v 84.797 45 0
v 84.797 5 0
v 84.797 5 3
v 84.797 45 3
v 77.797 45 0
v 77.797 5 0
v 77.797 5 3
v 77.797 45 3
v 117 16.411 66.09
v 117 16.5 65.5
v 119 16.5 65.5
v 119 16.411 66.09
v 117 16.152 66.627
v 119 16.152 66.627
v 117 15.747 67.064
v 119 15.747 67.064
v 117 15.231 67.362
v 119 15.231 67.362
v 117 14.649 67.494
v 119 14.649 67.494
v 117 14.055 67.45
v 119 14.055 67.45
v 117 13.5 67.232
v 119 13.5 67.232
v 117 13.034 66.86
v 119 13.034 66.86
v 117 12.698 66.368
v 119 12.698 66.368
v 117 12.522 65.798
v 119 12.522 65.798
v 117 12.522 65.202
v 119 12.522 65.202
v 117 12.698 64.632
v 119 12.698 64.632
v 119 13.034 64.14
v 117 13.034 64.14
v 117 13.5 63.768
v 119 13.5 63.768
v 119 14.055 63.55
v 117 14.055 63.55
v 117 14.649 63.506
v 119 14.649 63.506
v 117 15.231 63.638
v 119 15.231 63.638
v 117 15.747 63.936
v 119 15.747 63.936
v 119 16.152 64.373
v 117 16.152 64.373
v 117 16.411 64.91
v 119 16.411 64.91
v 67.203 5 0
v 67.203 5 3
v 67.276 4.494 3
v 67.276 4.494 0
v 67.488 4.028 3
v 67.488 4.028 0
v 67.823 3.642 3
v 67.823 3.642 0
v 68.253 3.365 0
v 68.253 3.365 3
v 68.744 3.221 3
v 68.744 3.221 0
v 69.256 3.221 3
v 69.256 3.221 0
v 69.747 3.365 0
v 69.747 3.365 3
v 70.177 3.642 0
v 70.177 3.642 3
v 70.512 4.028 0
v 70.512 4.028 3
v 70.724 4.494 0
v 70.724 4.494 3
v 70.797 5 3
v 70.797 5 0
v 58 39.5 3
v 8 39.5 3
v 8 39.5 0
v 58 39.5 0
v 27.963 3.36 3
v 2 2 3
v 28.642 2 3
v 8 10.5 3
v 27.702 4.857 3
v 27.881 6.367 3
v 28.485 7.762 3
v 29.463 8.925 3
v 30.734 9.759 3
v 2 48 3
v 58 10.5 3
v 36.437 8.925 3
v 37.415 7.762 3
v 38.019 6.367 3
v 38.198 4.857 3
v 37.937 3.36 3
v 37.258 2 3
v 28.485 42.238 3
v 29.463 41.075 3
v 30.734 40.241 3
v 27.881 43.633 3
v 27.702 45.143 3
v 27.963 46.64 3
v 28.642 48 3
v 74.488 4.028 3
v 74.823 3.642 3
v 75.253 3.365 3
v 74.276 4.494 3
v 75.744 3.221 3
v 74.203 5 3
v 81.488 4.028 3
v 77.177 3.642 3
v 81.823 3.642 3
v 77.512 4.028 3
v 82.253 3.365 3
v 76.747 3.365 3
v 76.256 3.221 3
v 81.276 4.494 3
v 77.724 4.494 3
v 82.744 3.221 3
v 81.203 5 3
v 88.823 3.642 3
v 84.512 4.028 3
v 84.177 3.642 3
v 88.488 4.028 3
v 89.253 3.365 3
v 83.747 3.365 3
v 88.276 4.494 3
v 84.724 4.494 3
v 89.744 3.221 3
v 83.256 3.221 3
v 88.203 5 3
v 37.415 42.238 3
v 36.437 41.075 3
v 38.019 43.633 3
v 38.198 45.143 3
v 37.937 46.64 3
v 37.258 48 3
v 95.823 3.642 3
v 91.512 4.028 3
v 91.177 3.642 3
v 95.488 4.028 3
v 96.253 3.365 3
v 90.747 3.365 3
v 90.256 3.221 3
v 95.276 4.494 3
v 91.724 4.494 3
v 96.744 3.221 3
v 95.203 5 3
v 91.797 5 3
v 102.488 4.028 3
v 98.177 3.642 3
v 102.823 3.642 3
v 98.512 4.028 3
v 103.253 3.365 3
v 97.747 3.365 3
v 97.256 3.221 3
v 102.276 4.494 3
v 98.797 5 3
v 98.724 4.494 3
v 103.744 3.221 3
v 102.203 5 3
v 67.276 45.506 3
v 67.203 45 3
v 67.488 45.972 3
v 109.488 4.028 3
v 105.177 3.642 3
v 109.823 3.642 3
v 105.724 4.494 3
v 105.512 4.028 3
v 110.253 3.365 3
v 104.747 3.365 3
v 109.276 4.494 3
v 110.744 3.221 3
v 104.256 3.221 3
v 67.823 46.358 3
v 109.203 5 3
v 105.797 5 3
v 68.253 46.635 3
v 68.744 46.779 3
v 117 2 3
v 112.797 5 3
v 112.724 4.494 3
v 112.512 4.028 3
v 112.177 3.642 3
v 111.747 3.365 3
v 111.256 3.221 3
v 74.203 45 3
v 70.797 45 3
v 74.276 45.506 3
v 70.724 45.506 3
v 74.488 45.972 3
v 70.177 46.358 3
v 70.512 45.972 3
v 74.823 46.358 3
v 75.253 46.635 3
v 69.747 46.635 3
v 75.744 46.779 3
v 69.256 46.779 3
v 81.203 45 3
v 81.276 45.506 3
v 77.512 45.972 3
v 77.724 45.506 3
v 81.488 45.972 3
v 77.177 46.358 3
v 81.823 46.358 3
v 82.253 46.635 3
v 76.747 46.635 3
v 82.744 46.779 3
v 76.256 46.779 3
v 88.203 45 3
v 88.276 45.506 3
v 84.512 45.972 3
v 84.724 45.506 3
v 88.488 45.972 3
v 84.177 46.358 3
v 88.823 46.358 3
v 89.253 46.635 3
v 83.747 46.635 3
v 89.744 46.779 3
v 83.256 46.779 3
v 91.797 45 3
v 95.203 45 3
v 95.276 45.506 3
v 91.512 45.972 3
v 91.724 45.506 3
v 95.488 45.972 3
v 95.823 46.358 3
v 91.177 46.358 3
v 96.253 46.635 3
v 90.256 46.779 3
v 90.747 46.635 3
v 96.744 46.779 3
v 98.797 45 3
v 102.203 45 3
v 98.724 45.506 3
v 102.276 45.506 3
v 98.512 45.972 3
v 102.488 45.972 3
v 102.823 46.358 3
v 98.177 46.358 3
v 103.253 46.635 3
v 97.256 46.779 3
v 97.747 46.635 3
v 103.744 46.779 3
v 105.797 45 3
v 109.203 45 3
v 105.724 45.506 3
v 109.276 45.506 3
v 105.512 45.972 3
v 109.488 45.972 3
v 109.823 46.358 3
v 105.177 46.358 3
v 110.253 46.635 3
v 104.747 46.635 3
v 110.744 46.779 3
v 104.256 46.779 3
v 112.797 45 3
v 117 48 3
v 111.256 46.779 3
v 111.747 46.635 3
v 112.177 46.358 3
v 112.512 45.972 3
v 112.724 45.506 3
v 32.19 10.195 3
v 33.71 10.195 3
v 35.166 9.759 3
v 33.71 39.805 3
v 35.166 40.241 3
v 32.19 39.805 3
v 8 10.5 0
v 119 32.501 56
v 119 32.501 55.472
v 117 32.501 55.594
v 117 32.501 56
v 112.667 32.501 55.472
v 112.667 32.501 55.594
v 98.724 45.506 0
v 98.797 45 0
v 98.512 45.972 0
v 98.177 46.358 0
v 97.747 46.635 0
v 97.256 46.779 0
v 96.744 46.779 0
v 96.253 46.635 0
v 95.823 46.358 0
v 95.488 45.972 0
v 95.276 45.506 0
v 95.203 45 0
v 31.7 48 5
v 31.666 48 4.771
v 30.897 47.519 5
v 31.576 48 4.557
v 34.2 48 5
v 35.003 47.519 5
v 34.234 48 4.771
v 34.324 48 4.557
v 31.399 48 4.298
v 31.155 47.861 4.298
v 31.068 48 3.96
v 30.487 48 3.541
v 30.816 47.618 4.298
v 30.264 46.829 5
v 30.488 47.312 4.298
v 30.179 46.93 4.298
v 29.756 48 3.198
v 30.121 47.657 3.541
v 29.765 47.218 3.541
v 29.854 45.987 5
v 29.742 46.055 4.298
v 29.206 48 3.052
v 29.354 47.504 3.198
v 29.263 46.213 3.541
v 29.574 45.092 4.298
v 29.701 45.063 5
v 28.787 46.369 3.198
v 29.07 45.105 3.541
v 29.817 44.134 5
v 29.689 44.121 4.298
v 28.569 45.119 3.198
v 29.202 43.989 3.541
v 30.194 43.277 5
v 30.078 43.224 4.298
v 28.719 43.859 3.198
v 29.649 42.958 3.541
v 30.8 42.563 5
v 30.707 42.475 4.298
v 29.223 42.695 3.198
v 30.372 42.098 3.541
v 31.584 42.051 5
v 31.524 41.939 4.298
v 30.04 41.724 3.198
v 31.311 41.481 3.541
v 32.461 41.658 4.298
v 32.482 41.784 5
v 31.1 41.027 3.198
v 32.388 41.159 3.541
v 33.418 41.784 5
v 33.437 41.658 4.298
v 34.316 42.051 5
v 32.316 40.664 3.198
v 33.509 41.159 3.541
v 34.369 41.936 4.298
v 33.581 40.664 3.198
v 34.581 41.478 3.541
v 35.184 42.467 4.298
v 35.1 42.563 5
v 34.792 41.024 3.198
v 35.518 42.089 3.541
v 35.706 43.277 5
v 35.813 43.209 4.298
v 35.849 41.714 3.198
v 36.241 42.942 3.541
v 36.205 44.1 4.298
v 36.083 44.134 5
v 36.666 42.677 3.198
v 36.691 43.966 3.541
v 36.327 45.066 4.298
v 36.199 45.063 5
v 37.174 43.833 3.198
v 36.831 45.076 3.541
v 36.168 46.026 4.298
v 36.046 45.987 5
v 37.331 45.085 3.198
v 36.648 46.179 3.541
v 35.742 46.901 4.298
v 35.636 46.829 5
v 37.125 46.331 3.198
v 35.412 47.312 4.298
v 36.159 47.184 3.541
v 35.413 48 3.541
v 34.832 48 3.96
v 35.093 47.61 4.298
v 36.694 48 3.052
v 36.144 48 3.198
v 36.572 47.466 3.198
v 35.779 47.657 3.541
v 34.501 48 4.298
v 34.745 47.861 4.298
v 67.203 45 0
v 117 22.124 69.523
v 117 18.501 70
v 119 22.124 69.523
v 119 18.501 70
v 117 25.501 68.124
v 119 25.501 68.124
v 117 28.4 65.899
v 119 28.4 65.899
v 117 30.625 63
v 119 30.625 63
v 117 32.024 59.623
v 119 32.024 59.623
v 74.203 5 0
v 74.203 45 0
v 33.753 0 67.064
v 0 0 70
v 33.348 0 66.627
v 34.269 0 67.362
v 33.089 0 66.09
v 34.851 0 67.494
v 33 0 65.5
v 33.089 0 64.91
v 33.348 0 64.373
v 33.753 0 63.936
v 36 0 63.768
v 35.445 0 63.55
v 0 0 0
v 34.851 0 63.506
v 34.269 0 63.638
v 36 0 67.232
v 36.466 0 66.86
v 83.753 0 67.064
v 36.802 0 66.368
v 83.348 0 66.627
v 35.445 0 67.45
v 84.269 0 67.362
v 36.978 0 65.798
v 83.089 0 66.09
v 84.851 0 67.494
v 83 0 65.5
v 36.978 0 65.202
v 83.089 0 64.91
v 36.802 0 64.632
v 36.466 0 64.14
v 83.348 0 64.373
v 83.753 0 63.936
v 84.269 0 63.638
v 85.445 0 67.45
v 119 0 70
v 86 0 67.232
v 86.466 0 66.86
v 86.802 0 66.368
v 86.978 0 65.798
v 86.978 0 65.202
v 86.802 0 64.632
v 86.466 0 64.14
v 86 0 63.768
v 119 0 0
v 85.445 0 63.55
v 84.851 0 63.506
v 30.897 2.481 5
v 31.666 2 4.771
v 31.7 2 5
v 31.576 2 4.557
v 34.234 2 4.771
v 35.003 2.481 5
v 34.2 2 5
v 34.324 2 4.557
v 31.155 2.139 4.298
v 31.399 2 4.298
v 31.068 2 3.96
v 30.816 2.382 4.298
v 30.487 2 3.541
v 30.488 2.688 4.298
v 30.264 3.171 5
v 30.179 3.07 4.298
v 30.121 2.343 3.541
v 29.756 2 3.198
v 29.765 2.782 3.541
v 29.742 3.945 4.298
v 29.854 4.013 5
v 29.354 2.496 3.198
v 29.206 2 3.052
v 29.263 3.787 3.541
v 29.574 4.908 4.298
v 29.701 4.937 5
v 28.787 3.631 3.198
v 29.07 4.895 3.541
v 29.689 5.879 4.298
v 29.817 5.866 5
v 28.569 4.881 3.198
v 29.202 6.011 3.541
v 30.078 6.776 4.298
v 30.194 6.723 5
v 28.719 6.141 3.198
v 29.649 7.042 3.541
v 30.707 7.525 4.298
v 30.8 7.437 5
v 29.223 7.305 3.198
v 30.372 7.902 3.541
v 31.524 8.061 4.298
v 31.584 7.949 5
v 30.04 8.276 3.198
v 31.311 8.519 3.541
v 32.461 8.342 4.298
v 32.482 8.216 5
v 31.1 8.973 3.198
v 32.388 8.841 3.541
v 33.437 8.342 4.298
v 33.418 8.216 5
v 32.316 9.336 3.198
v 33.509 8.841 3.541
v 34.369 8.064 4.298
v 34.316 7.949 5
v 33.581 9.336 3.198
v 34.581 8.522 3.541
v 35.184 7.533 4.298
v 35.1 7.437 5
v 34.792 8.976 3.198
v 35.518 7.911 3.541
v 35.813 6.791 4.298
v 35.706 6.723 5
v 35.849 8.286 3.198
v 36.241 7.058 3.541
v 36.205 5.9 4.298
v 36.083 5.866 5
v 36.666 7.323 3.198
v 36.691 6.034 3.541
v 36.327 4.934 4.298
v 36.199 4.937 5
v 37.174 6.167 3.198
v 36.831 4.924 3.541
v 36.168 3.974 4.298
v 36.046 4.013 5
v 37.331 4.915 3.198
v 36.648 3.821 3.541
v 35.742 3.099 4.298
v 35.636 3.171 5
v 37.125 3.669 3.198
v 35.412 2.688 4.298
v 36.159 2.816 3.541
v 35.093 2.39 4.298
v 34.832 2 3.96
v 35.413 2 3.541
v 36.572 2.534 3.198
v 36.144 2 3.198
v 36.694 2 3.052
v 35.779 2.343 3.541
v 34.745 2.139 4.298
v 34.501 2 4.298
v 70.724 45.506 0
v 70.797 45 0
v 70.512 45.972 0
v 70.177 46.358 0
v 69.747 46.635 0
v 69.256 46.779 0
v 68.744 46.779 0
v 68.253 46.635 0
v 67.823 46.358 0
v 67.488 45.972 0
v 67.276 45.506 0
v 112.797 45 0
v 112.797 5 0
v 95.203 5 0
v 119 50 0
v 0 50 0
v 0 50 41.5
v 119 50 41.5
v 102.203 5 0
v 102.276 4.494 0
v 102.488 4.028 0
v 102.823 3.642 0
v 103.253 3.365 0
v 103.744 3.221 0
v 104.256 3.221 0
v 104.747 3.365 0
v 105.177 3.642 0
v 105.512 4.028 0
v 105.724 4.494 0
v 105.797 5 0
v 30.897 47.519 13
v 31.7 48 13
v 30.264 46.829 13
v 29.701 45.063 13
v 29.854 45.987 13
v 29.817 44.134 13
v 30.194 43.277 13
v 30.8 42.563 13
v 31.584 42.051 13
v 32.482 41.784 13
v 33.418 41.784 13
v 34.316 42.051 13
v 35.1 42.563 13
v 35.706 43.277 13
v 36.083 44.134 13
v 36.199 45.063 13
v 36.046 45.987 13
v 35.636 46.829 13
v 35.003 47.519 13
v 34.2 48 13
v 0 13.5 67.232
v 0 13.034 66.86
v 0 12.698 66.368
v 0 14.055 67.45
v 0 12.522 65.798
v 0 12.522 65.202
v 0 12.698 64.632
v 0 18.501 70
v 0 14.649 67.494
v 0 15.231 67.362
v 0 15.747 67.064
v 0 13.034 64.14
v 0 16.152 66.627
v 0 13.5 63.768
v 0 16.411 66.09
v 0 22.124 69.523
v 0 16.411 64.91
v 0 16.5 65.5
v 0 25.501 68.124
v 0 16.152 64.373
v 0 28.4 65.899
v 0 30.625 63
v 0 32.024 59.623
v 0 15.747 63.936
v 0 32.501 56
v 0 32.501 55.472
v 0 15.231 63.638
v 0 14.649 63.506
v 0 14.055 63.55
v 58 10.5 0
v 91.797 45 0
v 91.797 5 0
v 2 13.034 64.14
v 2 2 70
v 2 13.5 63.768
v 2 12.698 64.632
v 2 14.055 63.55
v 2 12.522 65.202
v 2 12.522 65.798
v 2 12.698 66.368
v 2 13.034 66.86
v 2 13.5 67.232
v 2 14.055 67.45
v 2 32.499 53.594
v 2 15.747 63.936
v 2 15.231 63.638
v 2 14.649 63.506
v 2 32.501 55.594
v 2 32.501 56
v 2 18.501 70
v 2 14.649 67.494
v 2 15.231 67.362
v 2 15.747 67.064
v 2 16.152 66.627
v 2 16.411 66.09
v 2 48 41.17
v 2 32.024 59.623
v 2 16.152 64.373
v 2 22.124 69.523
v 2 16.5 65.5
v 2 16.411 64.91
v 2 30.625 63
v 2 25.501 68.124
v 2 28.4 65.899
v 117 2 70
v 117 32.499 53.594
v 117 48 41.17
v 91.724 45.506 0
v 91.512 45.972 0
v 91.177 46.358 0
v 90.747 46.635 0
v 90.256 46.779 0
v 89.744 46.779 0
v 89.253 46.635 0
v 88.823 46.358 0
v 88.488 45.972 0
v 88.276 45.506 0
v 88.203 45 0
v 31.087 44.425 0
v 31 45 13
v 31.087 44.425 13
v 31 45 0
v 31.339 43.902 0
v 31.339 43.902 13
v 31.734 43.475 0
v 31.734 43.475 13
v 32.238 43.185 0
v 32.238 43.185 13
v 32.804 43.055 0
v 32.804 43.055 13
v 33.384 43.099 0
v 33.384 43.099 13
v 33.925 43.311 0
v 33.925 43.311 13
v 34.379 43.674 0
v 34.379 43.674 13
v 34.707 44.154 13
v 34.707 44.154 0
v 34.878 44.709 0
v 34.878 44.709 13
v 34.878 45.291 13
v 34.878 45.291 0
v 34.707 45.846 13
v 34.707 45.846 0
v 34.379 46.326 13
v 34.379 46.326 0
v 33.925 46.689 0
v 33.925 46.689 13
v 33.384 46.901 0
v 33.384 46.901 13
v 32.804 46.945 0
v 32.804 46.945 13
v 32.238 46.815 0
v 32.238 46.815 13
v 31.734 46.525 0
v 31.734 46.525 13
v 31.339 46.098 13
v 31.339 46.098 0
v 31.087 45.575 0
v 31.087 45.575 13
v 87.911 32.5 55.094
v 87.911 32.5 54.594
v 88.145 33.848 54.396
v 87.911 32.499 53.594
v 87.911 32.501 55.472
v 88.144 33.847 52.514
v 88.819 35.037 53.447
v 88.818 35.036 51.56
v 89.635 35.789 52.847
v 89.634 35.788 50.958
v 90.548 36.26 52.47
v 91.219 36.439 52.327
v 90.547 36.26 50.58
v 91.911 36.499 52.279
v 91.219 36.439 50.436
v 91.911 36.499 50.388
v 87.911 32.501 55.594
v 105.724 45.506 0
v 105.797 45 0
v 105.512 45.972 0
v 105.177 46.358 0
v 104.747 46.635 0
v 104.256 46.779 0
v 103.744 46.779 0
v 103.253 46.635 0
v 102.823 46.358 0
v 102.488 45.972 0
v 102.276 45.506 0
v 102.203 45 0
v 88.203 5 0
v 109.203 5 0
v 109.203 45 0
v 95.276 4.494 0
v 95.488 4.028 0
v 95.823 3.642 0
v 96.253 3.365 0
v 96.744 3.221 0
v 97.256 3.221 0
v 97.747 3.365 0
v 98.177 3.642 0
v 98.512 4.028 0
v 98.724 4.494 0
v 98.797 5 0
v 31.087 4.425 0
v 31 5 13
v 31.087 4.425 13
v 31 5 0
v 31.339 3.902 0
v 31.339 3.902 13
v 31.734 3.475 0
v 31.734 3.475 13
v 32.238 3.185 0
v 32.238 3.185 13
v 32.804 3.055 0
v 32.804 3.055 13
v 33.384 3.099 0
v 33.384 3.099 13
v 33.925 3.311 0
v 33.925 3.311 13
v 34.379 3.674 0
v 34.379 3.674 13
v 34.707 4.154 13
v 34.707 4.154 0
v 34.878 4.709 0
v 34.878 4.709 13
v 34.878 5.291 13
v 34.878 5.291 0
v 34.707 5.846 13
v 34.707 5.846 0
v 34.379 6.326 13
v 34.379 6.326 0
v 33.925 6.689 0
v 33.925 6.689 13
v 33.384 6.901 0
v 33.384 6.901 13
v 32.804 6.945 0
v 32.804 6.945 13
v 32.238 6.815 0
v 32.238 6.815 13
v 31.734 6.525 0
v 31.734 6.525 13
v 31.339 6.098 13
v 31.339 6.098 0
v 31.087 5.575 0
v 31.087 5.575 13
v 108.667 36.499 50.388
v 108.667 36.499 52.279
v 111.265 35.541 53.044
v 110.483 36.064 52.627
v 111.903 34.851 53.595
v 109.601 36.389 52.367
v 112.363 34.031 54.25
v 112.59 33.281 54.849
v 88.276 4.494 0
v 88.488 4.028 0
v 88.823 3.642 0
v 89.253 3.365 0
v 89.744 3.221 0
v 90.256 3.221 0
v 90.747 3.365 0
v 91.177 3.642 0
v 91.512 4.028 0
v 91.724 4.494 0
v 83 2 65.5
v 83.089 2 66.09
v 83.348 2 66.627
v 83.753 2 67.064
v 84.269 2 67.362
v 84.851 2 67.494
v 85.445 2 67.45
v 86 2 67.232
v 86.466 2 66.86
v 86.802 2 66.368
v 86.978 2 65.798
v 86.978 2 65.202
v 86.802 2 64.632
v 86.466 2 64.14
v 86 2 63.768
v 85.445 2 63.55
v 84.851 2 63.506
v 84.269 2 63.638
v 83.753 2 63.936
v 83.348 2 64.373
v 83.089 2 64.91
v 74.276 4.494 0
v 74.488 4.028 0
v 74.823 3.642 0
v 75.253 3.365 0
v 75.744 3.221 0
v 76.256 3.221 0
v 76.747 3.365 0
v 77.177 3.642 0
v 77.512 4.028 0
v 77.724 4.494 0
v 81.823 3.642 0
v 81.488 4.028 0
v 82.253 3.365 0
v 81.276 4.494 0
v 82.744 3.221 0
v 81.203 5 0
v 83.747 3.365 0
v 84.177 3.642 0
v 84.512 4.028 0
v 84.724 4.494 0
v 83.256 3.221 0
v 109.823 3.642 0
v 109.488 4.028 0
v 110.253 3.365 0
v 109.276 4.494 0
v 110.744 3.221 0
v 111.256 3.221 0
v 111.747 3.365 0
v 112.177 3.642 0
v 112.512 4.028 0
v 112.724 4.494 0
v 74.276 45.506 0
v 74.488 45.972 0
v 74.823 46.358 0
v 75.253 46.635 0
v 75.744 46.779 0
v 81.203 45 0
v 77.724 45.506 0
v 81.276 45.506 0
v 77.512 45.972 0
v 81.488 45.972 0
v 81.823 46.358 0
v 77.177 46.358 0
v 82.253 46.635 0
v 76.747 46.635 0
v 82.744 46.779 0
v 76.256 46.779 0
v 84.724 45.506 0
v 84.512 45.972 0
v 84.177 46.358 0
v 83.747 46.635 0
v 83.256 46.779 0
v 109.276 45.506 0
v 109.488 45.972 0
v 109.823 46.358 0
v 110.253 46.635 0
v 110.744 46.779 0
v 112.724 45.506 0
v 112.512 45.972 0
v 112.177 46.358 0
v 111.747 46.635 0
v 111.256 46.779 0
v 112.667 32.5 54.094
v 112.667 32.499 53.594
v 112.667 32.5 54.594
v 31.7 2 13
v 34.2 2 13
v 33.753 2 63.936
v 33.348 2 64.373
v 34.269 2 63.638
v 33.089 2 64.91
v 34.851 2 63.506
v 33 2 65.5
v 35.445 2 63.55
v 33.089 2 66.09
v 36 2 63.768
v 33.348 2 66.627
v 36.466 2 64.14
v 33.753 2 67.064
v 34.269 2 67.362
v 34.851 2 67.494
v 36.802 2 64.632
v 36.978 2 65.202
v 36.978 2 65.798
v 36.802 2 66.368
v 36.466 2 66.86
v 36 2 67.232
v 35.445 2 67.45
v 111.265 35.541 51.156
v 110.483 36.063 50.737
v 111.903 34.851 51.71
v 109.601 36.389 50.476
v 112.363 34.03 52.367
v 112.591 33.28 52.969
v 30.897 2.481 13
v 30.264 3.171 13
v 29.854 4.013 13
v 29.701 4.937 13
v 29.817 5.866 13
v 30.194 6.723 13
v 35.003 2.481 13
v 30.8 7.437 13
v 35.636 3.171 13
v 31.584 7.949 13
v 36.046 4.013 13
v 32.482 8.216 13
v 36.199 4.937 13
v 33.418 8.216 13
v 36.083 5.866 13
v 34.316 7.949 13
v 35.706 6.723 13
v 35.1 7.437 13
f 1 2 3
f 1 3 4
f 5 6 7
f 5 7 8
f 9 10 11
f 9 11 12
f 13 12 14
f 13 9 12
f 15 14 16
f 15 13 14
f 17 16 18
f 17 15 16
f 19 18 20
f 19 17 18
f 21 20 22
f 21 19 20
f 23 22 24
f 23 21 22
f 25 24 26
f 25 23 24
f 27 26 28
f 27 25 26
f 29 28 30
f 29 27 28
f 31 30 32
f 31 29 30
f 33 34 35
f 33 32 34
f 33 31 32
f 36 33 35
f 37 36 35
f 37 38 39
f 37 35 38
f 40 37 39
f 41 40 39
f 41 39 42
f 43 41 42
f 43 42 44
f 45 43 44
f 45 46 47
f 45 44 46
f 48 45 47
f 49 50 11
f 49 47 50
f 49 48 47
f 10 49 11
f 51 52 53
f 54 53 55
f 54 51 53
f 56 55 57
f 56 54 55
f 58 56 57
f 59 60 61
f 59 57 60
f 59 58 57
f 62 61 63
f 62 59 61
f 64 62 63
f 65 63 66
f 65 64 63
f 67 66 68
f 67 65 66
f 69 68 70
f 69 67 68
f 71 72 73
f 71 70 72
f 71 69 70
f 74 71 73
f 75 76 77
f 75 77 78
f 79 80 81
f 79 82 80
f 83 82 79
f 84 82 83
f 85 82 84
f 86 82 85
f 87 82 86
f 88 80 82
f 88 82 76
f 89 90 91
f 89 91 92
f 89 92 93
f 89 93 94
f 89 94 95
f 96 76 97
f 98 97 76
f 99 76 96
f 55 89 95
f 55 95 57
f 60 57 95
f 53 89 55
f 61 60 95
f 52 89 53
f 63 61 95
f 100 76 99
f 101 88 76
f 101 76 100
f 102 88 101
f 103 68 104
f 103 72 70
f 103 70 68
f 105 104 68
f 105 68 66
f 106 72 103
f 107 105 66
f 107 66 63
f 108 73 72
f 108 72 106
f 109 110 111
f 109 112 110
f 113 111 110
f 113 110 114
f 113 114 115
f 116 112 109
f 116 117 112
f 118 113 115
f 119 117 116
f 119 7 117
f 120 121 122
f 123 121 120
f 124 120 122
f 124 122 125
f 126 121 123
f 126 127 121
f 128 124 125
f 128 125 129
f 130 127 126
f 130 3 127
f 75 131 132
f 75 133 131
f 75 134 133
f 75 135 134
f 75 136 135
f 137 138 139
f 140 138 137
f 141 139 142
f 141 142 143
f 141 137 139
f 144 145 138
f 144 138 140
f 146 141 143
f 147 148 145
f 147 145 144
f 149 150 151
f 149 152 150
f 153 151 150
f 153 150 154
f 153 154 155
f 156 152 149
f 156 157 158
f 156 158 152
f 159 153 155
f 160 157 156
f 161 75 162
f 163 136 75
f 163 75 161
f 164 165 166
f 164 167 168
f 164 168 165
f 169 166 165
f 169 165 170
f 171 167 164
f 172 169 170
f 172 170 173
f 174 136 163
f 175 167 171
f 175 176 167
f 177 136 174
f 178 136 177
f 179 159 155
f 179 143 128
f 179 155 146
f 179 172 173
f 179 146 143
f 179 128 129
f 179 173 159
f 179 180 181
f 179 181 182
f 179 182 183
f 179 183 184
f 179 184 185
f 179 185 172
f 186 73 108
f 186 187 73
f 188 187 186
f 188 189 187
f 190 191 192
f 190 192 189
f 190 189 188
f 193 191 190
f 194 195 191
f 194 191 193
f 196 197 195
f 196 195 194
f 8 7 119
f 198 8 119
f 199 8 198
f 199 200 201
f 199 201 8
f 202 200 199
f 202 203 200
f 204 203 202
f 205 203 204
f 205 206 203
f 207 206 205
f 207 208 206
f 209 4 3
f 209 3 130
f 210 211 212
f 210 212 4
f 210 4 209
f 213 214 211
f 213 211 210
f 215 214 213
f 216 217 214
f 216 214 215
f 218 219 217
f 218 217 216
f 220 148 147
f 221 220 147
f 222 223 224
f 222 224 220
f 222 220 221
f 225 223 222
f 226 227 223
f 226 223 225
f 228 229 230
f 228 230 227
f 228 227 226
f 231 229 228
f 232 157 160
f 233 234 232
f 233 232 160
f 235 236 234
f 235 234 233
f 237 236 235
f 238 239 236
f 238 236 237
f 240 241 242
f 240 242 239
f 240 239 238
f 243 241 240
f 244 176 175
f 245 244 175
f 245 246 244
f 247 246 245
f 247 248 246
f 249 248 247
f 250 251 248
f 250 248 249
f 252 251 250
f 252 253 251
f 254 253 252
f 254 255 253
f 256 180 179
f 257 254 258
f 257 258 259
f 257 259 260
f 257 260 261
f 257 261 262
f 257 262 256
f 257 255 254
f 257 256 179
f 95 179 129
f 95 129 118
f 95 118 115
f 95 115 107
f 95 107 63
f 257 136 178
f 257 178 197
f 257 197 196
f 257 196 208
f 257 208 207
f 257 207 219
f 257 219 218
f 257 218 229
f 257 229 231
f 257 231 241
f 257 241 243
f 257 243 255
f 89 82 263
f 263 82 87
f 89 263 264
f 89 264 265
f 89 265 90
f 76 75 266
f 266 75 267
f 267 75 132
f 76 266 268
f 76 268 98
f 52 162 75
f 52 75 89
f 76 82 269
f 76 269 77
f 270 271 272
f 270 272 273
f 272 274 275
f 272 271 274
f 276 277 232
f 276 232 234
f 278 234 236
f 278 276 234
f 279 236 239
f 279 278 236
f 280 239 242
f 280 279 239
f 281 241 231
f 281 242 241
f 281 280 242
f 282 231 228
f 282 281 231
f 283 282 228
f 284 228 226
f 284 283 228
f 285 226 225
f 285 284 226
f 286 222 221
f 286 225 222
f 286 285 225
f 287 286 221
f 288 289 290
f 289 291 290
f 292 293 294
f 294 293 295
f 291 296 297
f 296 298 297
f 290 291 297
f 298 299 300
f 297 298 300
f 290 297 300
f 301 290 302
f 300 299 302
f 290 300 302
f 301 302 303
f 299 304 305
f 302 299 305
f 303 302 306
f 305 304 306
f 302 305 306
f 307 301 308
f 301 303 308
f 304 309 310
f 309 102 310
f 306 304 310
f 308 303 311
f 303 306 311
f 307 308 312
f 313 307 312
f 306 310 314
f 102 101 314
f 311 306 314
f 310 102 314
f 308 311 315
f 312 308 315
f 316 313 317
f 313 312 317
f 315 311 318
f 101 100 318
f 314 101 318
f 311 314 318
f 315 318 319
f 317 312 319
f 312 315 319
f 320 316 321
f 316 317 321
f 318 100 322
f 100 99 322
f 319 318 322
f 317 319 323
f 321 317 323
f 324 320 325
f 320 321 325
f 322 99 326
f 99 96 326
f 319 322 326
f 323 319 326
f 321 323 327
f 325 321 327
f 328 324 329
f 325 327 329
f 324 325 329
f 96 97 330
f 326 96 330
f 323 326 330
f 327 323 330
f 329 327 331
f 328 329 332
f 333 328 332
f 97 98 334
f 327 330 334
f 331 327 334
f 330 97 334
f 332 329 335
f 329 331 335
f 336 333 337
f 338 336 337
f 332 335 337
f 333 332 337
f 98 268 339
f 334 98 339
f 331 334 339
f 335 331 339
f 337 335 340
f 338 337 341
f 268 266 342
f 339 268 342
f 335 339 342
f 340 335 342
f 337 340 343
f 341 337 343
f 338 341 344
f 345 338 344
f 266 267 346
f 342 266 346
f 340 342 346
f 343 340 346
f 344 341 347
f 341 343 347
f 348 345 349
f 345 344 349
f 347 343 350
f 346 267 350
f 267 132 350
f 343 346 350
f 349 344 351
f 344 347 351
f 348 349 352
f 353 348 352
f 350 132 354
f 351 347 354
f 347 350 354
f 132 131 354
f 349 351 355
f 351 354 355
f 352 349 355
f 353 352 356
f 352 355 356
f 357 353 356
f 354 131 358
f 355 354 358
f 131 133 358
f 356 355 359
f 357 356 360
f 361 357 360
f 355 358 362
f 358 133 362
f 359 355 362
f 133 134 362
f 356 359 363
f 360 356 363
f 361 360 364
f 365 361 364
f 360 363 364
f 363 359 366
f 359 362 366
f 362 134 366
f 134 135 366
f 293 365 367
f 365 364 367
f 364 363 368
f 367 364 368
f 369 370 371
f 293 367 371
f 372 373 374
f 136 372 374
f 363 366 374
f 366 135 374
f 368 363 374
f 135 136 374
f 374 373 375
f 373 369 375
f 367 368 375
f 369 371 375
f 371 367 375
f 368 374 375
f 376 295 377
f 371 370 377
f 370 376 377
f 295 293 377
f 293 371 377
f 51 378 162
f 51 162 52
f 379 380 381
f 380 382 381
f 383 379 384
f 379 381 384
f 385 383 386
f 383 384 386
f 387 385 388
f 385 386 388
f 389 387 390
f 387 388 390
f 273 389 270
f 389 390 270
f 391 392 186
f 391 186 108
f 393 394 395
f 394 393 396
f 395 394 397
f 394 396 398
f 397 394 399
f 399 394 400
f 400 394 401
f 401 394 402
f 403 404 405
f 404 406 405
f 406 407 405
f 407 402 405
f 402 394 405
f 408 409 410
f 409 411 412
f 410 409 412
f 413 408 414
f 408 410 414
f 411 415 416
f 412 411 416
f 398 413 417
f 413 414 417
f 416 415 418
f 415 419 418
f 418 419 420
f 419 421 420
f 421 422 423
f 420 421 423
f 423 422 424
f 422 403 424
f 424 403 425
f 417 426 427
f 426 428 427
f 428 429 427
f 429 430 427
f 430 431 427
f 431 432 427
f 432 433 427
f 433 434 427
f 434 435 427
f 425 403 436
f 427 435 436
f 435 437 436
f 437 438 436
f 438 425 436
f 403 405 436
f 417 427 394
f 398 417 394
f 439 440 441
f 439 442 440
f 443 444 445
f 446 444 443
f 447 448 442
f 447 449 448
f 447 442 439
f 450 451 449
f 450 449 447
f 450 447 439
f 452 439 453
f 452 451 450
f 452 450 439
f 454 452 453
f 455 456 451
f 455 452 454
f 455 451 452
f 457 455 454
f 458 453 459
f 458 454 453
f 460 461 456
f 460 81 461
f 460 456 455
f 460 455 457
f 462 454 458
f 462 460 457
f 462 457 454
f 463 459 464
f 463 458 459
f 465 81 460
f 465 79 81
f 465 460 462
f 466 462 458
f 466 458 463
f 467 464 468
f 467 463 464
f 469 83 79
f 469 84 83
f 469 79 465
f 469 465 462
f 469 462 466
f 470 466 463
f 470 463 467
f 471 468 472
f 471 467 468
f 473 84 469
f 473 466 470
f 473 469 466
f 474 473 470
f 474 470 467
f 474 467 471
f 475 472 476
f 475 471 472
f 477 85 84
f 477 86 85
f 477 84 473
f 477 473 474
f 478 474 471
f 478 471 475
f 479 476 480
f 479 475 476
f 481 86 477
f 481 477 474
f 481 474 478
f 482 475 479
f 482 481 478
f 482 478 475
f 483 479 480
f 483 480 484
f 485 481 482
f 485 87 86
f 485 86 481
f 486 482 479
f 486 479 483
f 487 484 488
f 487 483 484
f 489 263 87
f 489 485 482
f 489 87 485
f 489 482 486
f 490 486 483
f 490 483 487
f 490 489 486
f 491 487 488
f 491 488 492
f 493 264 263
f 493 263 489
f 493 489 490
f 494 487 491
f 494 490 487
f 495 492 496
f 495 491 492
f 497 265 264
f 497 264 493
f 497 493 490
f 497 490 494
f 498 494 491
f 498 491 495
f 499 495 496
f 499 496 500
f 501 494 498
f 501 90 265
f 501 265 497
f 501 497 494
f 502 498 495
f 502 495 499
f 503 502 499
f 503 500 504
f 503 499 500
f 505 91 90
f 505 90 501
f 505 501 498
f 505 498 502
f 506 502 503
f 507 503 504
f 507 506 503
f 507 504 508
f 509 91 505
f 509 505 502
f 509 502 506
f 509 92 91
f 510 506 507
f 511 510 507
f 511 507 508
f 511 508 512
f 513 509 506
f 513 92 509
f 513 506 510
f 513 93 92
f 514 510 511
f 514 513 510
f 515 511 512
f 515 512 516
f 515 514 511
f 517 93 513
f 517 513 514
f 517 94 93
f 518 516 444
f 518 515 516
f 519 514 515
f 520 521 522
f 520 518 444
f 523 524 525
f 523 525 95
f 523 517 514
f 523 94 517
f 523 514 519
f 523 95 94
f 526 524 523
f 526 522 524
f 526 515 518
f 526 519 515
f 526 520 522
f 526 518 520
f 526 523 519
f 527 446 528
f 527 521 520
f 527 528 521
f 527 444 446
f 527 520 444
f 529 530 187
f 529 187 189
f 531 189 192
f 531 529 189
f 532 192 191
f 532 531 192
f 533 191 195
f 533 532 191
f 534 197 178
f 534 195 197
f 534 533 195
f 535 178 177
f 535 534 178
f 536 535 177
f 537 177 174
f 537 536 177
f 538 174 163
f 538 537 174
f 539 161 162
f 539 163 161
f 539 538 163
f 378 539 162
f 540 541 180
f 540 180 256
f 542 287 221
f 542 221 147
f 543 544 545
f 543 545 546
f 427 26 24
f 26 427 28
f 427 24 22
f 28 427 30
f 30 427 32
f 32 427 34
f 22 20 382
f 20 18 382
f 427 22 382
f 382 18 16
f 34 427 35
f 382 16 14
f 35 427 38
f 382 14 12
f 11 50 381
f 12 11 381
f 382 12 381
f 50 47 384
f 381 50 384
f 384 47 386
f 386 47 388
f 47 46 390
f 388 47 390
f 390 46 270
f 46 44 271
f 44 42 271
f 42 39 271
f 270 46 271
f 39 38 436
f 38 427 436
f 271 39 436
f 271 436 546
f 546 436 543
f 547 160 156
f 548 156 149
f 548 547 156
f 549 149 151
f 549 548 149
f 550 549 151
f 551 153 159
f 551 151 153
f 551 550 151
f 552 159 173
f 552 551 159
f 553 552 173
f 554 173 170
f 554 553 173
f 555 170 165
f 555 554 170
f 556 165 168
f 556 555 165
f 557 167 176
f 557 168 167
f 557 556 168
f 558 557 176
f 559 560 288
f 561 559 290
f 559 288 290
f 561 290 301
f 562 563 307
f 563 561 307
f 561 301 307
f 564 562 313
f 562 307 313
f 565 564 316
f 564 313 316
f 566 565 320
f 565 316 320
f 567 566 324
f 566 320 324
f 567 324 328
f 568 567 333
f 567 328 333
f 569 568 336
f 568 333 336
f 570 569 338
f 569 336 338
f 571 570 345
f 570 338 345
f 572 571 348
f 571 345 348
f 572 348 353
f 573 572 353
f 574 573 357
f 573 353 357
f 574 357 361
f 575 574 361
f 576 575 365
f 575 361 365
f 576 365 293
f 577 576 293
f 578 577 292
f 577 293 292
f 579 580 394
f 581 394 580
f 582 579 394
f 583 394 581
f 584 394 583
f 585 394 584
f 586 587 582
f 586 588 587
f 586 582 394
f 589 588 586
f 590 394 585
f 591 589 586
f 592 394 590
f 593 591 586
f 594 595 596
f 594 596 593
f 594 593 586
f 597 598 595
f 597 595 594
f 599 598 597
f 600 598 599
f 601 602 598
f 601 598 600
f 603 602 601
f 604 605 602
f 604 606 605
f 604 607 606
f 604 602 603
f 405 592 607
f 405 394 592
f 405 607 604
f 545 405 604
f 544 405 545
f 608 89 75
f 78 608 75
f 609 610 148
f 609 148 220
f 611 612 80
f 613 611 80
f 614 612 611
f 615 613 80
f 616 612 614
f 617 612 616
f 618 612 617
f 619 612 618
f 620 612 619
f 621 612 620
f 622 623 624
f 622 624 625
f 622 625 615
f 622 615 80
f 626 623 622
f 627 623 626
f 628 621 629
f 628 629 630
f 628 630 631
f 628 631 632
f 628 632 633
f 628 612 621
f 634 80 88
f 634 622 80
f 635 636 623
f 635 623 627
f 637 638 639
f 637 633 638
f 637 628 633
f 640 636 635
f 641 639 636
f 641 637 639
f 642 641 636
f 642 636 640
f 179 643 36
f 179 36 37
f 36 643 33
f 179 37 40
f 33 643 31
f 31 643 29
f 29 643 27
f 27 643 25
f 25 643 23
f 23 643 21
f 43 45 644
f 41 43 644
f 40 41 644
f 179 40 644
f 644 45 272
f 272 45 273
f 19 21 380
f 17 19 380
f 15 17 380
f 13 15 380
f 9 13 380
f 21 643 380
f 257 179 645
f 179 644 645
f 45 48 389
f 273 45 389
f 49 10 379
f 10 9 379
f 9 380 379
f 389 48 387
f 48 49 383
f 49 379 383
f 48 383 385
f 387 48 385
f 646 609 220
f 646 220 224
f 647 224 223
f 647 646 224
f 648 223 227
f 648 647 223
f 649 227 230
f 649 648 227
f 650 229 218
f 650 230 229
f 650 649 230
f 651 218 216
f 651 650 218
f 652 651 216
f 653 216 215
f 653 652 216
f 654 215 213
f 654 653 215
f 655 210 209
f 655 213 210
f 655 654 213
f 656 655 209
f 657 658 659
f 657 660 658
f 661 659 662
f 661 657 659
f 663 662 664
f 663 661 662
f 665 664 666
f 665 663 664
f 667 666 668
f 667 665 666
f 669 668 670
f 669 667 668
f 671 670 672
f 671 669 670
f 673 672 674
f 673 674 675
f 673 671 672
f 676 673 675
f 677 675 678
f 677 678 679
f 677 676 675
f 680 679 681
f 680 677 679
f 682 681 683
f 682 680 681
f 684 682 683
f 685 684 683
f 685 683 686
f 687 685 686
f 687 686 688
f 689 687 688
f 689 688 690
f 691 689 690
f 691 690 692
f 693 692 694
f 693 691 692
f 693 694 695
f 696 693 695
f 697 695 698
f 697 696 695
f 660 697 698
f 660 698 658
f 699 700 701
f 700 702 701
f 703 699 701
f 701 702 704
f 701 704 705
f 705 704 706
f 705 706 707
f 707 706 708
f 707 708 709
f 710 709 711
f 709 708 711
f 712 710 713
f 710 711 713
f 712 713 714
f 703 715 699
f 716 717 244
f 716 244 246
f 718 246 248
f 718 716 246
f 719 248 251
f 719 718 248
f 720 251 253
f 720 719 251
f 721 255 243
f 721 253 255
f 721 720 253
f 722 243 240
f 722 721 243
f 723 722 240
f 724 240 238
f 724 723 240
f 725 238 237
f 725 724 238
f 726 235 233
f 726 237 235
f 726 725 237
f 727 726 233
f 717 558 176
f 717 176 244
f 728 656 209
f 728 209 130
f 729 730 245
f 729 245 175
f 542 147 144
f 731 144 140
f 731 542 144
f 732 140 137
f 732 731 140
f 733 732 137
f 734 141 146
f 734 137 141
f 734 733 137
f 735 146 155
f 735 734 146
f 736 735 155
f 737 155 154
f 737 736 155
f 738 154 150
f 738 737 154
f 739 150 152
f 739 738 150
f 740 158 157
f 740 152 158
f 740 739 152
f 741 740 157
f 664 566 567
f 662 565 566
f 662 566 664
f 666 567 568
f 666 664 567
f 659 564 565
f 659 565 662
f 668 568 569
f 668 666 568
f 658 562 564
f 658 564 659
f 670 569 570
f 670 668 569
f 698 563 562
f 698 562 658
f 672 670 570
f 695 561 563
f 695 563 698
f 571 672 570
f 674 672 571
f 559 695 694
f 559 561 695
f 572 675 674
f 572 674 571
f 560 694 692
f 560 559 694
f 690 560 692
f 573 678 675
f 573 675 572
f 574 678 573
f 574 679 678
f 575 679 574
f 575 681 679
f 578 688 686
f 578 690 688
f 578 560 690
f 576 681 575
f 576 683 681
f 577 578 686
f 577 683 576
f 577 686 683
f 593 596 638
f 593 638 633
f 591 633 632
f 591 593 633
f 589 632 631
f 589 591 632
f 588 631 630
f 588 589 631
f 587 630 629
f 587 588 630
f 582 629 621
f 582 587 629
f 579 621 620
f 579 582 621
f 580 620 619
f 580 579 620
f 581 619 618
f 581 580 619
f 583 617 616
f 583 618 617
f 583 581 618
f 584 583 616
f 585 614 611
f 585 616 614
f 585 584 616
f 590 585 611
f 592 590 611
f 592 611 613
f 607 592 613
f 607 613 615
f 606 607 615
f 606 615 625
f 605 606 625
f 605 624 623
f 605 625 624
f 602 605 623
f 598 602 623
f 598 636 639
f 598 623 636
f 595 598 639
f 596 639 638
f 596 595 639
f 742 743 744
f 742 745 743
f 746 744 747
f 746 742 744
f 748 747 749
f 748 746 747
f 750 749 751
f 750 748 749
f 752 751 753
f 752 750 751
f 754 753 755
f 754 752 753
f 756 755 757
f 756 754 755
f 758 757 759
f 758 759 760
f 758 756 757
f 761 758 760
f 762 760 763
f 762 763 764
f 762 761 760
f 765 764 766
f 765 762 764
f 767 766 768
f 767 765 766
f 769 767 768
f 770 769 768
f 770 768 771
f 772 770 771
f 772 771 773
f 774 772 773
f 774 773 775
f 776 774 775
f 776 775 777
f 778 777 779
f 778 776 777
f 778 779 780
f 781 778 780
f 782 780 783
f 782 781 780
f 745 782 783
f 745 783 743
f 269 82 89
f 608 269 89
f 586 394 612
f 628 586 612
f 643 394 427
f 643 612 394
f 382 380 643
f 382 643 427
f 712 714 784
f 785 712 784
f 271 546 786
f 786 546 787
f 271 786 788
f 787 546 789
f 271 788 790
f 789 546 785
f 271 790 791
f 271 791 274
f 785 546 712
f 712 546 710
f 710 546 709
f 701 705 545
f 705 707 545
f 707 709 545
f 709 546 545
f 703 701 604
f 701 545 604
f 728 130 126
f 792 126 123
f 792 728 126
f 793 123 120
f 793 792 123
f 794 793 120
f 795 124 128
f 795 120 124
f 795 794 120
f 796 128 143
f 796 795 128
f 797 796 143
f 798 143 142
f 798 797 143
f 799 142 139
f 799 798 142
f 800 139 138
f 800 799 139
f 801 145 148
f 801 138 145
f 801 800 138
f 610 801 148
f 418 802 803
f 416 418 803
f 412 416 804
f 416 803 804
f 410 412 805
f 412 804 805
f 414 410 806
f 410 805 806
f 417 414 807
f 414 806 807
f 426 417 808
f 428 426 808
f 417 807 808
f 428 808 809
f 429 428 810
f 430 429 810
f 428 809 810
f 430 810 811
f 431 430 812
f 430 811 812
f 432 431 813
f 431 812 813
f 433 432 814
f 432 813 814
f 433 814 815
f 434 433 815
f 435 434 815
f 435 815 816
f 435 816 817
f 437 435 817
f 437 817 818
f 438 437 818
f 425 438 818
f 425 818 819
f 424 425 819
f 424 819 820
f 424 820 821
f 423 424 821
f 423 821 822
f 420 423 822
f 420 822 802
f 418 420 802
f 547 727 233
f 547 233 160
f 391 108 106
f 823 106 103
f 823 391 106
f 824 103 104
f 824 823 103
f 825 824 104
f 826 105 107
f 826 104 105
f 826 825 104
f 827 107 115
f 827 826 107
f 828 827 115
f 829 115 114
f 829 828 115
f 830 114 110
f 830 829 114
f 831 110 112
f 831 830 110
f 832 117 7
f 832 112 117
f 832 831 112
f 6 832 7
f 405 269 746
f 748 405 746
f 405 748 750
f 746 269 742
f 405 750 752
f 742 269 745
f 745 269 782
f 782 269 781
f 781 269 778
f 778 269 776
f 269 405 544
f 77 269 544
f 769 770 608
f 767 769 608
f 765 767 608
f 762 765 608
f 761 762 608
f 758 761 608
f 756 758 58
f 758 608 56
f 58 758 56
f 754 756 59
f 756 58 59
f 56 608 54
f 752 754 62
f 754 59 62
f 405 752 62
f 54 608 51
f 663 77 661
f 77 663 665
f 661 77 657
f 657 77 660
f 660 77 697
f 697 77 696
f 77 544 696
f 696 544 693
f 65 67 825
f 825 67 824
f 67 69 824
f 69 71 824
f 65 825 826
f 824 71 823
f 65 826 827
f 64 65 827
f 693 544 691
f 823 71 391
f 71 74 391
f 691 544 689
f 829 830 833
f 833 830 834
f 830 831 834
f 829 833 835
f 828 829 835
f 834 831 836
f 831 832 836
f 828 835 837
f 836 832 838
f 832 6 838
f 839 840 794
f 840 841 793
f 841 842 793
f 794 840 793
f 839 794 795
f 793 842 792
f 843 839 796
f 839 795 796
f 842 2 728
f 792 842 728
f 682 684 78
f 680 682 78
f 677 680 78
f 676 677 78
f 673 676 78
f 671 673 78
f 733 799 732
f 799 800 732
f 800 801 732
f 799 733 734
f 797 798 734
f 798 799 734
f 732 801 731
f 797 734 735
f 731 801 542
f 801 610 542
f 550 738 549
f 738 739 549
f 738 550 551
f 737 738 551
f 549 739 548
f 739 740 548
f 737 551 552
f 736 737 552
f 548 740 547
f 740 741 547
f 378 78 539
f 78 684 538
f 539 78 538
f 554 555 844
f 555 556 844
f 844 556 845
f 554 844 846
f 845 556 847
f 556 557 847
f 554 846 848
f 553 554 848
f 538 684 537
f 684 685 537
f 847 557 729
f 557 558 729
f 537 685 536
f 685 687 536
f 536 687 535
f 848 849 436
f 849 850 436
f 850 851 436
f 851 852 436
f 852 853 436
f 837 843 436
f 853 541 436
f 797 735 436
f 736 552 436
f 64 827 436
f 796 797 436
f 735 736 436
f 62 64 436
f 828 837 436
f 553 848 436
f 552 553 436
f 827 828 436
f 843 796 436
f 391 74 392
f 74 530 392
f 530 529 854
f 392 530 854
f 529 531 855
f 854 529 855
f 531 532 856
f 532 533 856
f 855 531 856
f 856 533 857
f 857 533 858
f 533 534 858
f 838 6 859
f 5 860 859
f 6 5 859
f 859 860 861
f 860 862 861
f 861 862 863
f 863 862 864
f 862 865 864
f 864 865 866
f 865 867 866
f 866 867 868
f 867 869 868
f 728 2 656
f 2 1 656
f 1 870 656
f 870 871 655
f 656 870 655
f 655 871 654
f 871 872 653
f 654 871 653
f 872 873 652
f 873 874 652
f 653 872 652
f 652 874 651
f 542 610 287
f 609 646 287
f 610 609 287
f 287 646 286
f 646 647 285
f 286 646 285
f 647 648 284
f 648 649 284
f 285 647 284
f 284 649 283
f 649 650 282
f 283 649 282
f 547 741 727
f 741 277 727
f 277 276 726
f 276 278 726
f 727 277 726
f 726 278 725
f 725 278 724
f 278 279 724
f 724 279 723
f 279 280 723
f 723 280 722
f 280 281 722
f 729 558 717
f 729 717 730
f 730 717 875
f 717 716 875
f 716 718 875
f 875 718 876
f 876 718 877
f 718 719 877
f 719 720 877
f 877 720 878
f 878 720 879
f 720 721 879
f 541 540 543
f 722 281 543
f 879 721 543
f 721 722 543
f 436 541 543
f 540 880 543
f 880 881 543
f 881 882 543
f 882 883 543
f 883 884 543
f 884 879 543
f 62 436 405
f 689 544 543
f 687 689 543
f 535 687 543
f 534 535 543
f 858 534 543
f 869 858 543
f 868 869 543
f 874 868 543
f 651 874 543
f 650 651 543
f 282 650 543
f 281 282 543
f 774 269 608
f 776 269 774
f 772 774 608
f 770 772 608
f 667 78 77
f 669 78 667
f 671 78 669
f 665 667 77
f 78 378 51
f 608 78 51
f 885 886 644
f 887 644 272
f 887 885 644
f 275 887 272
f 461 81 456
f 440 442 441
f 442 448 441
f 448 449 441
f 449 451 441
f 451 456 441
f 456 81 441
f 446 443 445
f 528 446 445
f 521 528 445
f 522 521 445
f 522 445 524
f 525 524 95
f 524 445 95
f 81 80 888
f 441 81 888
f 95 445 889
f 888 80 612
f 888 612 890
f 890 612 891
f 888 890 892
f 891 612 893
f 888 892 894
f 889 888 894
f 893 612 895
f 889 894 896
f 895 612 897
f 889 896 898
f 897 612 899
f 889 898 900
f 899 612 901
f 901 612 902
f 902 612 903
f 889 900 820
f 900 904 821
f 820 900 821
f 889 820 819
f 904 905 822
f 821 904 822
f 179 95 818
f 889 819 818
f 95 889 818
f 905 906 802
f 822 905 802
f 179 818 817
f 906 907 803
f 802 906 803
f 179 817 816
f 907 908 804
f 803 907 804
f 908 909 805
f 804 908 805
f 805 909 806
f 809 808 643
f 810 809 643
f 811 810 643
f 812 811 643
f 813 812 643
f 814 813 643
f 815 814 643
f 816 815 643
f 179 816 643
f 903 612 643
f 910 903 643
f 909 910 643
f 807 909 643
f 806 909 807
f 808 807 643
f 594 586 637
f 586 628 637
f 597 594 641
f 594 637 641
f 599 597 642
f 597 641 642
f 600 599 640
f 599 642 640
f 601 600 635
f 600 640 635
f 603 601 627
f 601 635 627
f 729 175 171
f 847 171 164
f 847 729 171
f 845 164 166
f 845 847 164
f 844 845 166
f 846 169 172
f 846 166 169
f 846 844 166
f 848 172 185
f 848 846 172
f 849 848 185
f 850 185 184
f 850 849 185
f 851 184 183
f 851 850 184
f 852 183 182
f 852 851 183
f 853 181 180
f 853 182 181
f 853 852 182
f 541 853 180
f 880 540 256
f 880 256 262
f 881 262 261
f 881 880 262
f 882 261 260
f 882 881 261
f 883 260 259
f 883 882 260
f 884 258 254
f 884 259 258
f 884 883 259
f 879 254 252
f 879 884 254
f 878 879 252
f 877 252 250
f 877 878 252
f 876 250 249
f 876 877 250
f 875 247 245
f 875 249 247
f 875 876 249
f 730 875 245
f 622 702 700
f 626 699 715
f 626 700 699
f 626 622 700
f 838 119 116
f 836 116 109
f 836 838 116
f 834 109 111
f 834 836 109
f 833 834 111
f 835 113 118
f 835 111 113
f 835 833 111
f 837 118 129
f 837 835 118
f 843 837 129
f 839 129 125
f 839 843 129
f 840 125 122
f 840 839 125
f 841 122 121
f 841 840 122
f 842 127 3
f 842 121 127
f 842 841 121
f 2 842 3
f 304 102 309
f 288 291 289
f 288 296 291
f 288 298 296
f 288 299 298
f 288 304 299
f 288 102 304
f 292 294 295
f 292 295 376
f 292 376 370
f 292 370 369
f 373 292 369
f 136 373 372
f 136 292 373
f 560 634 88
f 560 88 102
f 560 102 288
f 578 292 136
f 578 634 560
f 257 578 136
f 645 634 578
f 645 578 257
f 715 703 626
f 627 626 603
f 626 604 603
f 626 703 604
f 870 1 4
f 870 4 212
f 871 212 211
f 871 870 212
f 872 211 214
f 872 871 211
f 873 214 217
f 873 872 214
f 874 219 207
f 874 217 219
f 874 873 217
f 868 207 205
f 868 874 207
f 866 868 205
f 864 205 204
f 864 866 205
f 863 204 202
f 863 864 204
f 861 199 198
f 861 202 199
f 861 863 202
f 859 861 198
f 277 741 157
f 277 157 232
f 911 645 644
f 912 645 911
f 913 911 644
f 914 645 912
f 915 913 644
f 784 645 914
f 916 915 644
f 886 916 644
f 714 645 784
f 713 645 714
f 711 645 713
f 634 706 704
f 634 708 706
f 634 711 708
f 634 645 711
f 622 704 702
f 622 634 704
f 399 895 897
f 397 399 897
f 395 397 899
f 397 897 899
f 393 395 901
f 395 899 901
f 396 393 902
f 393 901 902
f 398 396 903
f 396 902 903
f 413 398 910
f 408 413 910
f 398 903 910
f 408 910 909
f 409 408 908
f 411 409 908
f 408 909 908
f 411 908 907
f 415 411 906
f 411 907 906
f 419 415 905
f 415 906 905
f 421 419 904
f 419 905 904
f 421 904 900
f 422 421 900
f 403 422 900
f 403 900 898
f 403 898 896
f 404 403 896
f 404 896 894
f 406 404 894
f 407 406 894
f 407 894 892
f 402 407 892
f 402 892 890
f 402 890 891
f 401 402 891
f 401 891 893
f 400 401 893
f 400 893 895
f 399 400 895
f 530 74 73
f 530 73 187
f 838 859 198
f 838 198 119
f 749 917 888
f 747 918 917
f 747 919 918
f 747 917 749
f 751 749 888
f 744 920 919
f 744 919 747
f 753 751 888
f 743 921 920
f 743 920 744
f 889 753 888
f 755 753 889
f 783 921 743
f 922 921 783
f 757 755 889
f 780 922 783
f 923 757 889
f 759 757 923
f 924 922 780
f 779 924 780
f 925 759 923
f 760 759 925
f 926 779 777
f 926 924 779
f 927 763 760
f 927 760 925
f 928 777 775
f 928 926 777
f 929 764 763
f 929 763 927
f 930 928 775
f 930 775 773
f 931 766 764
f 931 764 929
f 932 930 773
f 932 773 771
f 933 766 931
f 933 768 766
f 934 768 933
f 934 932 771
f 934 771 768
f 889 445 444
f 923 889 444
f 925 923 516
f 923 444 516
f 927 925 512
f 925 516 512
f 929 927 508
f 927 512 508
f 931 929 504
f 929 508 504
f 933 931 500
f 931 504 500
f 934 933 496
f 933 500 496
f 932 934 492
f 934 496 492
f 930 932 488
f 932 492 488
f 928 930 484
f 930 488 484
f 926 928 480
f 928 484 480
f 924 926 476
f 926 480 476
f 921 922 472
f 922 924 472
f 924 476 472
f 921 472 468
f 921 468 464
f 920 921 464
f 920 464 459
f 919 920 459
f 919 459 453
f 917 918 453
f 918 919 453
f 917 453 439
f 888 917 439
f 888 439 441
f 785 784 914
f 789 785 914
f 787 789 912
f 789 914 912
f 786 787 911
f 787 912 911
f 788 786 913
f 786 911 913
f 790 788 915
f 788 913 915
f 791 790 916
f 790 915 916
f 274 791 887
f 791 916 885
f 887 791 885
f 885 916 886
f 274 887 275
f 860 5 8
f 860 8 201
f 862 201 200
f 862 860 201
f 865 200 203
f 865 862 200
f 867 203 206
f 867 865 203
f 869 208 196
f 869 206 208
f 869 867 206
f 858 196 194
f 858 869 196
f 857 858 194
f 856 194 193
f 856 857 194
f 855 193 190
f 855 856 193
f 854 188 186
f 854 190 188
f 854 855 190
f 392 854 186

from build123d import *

# Parameters (mm, degrees)
SKETCH1_W               = 119
SKETCH1_H               = 50
BOSS_EXTRUDE1_DEPTH     = 70
SKETCH2_W               = 115
SKETCH2_H               = 46
CUT_EXTRUDE1_DEPTH      = 67
SKETCH3_W               = 50
SKETCH3_H               = 29
CUT_EXTRUDE2_DEPTH      = 10
SKETCH4_R               = 1.95
CUT_EXTRUDE3_DEPTH      = 10
SKETCH5_R               = 3.25
SKETCH5_R_2             = 1.95
BOSS_EXTRUDE3_DEPTH     = 10
FILLET1_R               = 2
SKETCH6_R               = 2
CUT_EXTRUDE4_DEPTH      = 10
CUT_EXTRUDE5_DEPTH      = 146.220522014
CUT_EXTRUDE5_DEPTH_BACK = 146.220522014
SKETCH8_R               = 2
BOSS_EXTRUDE4_DEPTH     = 115
CUT_EXTRUDE6_DEPTH      = 146.220522014
CUT_EXTRUDE6_DEPTH_BACK = 146.220522014
FILLET2_R               = 14
CUT_EXTRUDE8_DEPTH      = 10
CUT_EXTRUDE9_DEPTH      = 143.341139563


with BuildPart() as part:
    # Sketch1 → Boss-Extrude1 (new body)
    with BuildSketch(Plane.XY):
        with Locations((59.5, 25)):
            Rectangle(SKETCH1_W, SKETCH1_H)
    extrude(amount=BOSS_EXTRUDE1_DEPTH)

    # Sketch2 → Cut-Extrude1 (cut)
    with BuildSketch(Plane.XY.offset(70)):
        with Locations((59.5, 25)):
            Rectangle(SKETCH2_W, SKETCH2_H)
    extrude(amount=-CUT_EXTRUDE1_DEPTH, mode=Mode.SUBTRACT)

    # Sketch3 → Cut-Extrude2 (cut)
    with BuildSketch(Plane.XY.offset(3)):
        with Locations((33, 25)):
            Rectangle(SKETCH3_W, SKETCH3_H)
    extrude(amount=-CUT_EXTRUDE2_DEPTH, mode=Mode.SUBTRACT)

    # Sketch4 → Cut-Extrude3 (cut)
    with BuildSketch(Plane(origin=(0, 0, 0), x_dir=(-1, 0, 0), z_dir=(0, 0, -1))):
        with Locations((-32.95, 45)):
            Circle(SKETCH4_R)
        with Locations((-32.95, 5)):
            Circle(SKETCH4_R)
    extrude(amount=-CUT_EXTRUDE3_DEPTH, mode=Mode.SUBTRACT)

    # Sketch5 → Boss-Extrude3 (add)
    # profile 1 of 2: a face of its own
    with BuildSketch(Plane.XY.offset(3)):
        with Locations((32.95, 45)):
            Circle(SKETCH5_R)
        with Locations(Location((32.95, 45, 0), (0, 0, 180))):
            Circle(SKETCH5_R_2, mode=Mode.SUBTRACT)
    # profile 2 of 2: a face of its own
    with BuildSketch(Plane.XY.offset(3)):
        with Locations((32.95, 5)):
            Circle(SKETCH5_R)
        with Locations(Location((32.95, 5, 0), (0, 0, 180))):
            Circle(SKETCH5_R_2, mode=Mode.SUBTRACT)
    extrude(amount=BOSS_EXTRUDE3_DEPTH)

    # Fillet1
    fillet1_edges = [part.edges().sort_by_distance(p)[0] for p in [
        (31.147224362, 42.295836543, 3),
        (31.147224362, 7.704163457, 3),
    ]]
    fillet(fillet1_edges, radius=FILLET1_R)

    # Sketch6 → Cut-Extrude4 (cut)
    with BuildSketch(Plane(origin=(0, 2, 0), x_dir=(1, 0, 0), z_dir=(0, 1, 0))):
        with Locations(Location((85, -65.5, 0), (0, 0, 180))):
            Circle(SKETCH6_R)
        with Locations(Location((35, -65.5, 0), (0, 0, 180))):
            Circle(SKETCH6_R)
    extrude(amount=-CUT_EXTRUDE4_DEPTH, mode=Mode.SUBTRACT)

    # Sketch8 → Cut-Extrude5 (cut, two sides: drawn at the far end of the back side and taken through both)
    with BuildSketch(Plane(origin=(2, 0, 0), x_dir=(0, 0, -1), z_dir=(1, 0, 0)).offset(-CUT_EXTRUDE5_DEPTH_BACK)):
        with Locations(Location((-65.5, 14.5, 0), (0, 0, 90))):
            Circle(SKETCH8_R)
    extrude(amount=CUT_EXTRUDE5_DEPTH + CUT_EXTRUDE5_DEPTH_BACK, mode=Mode.SUBTRACT)

    # Sketch9 → Boss-Extrude4 (add)
    with BuildSketch(Plane(origin=(2, 0, 0), x_dir=(0, 0, -1), z_dir=(1, 0, 0))):
        Polygon((-55.594060536, 32.500624229), (-43.169621176, 48), (-41.169621176, 48), (-53.594060926, 32.499375771), align=None)
    extrude(amount=BOSS_EXTRUDE4_DEPTH)

    # Sketch10 → Cut-Extrude6 (cut, two sides: drawn at the far end of the back side and taken through both)
    with BuildSketch(Plane(origin=(2, 0, 0), x_dir=(0, 0, -1), z_dir=(1, 0, 0)).offset(-CUT_EXTRUDE6_DEPTH_BACK)):
        Polygon((-55.471753528, 32.500624229), (-70, 32.500624229), (-70, 50), (-41.5, 50), align=None)
    extrude(amount=CUT_EXTRUDE6_DEPTH + CUT_EXTRUDE6_DEPTH_BACK, mode=Mode.SUBTRACT)

    # Fillet2
    fillet2_edges = [part.edges().sort_by_distance(p)[0] for p in [
        (118, 32.500624229, 70),
        (1, 32.500624229, 70),
    ]]
    fillet(fillet2_edges, radius=FILLET2_R)

    # Sketch11 → Cut-Extrude8 (cut)
    with BuildSketch(Plane(origin=(0, 0, 0), x_dir=(-1, 0, 0), z_dir=(0, 0, -1))):
        with BuildLine():
            Line((-109.202811856, 45), (-109.202811856, 5))
            ThreePointArc((-109.202811856, 5), (-111, 3.202811856), (-112.797188144, 5))
            Line((-112.797188144, 5), (-112.797188144, 45))
            ThreePointArc((-112.797188144, 45), (-111, 46.797188144), (-109.202811856, 45))
        make_face()
        with BuildLine():
            Line((-102.202811856, 45), (-102.202811856, 5))
            ThreePointArc((-102.202811856, 5), (-104, 3.202811856), (-105.797188144, 5))
            Line((-105.797188144, 5), (-105.797188144, 45))
            ThreePointArc((-105.797188144, 45), (-104, 46.797188144), (-102.202811856, 45))
        make_face()
        with BuildLine():
            Line((-95.202811856, 45), (-95.202811856, 5))
            ThreePointArc((-95.202811856, 5), (-97, 3.202811856), (-98.797188144, 5))
            Line((-98.797188144, 5), (-98.797188144, 45))
            ThreePointArc((-98.797188144, 45), (-97, 46.797188144), (-95.202811856, 45))
        make_face()
        with BuildLine():
            Line((-88.202811856, 45), (-88.202811856, 5))
            ThreePointArc((-88.202811856, 5), (-90, 3.202811856), (-91.797188144, 5))
            Line((-91.797188144, 5), (-91.797188144, 45))
            ThreePointArc((-91.797188144, 45), (-90, 46.797188144), (-88.202811856, 45))
        make_face()
        with BuildLine():
            Line((-81.202811856, 45), (-81.202811856, 5))
            ThreePointArc((-81.202811856, 5), (-83, 3.202811856), (-84.797188144, 5))
            Line((-84.797188144, 5), (-84.797188144, 45))
            ThreePointArc((-84.797188144, 45), (-83, 46.797188144), (-81.202811856, 45))
        make_face()
        with BuildLine():
            Line((-74.202811856, 45), (-74.202811856, 5))
            ThreePointArc((-74.202811856, 5), (-76, 3.202811856), (-77.797188144, 5))
            Line((-77.797188144, 5), (-77.797188144, 45))
            ThreePointArc((-77.797188144, 45), (-76, 46.797188144), (-74.202811856, 45))
        make_face()
        with BuildLine():
            Line((-67.202811856, 45), (-67.202811856, 5))
            ThreePointArc((-67.202811856, 5), (-69, 3.202811856), (-70.797188144, 5))
            Line((-70.797188144, 5), (-70.797188144, 45))
            ThreePointArc((-70.797188144, 45), (-69, 46.797188144), (-67.202811856, 45))
        make_face()
    extrude(amount=-CUT_EXTRUDE8_DEPTH, mode=Mode.SUBTRACT)

    # Sketch12 → Cut-Extrude9 (cut, through all)
    with BuildSketch(Plane.XY.offset(10)):
        with BuildLine():
            Line((108.667383108, 28.499375771), (91.910743178, 28.499375771))
            ThreePointArc((91.910743178, 28.499375771), (87.910743178, 32.499375771), (91.910743178, 36.499375771))
            Line((91.910743178, 36.499375771), (108.667383108, 36.499375771))
            ThreePointArc((108.667383108, 36.499375771), (112.667383108, 32.499375771), (108.667383108, 28.499375771))
        make_face()
    extrude(amount=CUT_EXTRUDE9_DEPTH, mode=Mode.SUBTRACT)


solid = part.part
